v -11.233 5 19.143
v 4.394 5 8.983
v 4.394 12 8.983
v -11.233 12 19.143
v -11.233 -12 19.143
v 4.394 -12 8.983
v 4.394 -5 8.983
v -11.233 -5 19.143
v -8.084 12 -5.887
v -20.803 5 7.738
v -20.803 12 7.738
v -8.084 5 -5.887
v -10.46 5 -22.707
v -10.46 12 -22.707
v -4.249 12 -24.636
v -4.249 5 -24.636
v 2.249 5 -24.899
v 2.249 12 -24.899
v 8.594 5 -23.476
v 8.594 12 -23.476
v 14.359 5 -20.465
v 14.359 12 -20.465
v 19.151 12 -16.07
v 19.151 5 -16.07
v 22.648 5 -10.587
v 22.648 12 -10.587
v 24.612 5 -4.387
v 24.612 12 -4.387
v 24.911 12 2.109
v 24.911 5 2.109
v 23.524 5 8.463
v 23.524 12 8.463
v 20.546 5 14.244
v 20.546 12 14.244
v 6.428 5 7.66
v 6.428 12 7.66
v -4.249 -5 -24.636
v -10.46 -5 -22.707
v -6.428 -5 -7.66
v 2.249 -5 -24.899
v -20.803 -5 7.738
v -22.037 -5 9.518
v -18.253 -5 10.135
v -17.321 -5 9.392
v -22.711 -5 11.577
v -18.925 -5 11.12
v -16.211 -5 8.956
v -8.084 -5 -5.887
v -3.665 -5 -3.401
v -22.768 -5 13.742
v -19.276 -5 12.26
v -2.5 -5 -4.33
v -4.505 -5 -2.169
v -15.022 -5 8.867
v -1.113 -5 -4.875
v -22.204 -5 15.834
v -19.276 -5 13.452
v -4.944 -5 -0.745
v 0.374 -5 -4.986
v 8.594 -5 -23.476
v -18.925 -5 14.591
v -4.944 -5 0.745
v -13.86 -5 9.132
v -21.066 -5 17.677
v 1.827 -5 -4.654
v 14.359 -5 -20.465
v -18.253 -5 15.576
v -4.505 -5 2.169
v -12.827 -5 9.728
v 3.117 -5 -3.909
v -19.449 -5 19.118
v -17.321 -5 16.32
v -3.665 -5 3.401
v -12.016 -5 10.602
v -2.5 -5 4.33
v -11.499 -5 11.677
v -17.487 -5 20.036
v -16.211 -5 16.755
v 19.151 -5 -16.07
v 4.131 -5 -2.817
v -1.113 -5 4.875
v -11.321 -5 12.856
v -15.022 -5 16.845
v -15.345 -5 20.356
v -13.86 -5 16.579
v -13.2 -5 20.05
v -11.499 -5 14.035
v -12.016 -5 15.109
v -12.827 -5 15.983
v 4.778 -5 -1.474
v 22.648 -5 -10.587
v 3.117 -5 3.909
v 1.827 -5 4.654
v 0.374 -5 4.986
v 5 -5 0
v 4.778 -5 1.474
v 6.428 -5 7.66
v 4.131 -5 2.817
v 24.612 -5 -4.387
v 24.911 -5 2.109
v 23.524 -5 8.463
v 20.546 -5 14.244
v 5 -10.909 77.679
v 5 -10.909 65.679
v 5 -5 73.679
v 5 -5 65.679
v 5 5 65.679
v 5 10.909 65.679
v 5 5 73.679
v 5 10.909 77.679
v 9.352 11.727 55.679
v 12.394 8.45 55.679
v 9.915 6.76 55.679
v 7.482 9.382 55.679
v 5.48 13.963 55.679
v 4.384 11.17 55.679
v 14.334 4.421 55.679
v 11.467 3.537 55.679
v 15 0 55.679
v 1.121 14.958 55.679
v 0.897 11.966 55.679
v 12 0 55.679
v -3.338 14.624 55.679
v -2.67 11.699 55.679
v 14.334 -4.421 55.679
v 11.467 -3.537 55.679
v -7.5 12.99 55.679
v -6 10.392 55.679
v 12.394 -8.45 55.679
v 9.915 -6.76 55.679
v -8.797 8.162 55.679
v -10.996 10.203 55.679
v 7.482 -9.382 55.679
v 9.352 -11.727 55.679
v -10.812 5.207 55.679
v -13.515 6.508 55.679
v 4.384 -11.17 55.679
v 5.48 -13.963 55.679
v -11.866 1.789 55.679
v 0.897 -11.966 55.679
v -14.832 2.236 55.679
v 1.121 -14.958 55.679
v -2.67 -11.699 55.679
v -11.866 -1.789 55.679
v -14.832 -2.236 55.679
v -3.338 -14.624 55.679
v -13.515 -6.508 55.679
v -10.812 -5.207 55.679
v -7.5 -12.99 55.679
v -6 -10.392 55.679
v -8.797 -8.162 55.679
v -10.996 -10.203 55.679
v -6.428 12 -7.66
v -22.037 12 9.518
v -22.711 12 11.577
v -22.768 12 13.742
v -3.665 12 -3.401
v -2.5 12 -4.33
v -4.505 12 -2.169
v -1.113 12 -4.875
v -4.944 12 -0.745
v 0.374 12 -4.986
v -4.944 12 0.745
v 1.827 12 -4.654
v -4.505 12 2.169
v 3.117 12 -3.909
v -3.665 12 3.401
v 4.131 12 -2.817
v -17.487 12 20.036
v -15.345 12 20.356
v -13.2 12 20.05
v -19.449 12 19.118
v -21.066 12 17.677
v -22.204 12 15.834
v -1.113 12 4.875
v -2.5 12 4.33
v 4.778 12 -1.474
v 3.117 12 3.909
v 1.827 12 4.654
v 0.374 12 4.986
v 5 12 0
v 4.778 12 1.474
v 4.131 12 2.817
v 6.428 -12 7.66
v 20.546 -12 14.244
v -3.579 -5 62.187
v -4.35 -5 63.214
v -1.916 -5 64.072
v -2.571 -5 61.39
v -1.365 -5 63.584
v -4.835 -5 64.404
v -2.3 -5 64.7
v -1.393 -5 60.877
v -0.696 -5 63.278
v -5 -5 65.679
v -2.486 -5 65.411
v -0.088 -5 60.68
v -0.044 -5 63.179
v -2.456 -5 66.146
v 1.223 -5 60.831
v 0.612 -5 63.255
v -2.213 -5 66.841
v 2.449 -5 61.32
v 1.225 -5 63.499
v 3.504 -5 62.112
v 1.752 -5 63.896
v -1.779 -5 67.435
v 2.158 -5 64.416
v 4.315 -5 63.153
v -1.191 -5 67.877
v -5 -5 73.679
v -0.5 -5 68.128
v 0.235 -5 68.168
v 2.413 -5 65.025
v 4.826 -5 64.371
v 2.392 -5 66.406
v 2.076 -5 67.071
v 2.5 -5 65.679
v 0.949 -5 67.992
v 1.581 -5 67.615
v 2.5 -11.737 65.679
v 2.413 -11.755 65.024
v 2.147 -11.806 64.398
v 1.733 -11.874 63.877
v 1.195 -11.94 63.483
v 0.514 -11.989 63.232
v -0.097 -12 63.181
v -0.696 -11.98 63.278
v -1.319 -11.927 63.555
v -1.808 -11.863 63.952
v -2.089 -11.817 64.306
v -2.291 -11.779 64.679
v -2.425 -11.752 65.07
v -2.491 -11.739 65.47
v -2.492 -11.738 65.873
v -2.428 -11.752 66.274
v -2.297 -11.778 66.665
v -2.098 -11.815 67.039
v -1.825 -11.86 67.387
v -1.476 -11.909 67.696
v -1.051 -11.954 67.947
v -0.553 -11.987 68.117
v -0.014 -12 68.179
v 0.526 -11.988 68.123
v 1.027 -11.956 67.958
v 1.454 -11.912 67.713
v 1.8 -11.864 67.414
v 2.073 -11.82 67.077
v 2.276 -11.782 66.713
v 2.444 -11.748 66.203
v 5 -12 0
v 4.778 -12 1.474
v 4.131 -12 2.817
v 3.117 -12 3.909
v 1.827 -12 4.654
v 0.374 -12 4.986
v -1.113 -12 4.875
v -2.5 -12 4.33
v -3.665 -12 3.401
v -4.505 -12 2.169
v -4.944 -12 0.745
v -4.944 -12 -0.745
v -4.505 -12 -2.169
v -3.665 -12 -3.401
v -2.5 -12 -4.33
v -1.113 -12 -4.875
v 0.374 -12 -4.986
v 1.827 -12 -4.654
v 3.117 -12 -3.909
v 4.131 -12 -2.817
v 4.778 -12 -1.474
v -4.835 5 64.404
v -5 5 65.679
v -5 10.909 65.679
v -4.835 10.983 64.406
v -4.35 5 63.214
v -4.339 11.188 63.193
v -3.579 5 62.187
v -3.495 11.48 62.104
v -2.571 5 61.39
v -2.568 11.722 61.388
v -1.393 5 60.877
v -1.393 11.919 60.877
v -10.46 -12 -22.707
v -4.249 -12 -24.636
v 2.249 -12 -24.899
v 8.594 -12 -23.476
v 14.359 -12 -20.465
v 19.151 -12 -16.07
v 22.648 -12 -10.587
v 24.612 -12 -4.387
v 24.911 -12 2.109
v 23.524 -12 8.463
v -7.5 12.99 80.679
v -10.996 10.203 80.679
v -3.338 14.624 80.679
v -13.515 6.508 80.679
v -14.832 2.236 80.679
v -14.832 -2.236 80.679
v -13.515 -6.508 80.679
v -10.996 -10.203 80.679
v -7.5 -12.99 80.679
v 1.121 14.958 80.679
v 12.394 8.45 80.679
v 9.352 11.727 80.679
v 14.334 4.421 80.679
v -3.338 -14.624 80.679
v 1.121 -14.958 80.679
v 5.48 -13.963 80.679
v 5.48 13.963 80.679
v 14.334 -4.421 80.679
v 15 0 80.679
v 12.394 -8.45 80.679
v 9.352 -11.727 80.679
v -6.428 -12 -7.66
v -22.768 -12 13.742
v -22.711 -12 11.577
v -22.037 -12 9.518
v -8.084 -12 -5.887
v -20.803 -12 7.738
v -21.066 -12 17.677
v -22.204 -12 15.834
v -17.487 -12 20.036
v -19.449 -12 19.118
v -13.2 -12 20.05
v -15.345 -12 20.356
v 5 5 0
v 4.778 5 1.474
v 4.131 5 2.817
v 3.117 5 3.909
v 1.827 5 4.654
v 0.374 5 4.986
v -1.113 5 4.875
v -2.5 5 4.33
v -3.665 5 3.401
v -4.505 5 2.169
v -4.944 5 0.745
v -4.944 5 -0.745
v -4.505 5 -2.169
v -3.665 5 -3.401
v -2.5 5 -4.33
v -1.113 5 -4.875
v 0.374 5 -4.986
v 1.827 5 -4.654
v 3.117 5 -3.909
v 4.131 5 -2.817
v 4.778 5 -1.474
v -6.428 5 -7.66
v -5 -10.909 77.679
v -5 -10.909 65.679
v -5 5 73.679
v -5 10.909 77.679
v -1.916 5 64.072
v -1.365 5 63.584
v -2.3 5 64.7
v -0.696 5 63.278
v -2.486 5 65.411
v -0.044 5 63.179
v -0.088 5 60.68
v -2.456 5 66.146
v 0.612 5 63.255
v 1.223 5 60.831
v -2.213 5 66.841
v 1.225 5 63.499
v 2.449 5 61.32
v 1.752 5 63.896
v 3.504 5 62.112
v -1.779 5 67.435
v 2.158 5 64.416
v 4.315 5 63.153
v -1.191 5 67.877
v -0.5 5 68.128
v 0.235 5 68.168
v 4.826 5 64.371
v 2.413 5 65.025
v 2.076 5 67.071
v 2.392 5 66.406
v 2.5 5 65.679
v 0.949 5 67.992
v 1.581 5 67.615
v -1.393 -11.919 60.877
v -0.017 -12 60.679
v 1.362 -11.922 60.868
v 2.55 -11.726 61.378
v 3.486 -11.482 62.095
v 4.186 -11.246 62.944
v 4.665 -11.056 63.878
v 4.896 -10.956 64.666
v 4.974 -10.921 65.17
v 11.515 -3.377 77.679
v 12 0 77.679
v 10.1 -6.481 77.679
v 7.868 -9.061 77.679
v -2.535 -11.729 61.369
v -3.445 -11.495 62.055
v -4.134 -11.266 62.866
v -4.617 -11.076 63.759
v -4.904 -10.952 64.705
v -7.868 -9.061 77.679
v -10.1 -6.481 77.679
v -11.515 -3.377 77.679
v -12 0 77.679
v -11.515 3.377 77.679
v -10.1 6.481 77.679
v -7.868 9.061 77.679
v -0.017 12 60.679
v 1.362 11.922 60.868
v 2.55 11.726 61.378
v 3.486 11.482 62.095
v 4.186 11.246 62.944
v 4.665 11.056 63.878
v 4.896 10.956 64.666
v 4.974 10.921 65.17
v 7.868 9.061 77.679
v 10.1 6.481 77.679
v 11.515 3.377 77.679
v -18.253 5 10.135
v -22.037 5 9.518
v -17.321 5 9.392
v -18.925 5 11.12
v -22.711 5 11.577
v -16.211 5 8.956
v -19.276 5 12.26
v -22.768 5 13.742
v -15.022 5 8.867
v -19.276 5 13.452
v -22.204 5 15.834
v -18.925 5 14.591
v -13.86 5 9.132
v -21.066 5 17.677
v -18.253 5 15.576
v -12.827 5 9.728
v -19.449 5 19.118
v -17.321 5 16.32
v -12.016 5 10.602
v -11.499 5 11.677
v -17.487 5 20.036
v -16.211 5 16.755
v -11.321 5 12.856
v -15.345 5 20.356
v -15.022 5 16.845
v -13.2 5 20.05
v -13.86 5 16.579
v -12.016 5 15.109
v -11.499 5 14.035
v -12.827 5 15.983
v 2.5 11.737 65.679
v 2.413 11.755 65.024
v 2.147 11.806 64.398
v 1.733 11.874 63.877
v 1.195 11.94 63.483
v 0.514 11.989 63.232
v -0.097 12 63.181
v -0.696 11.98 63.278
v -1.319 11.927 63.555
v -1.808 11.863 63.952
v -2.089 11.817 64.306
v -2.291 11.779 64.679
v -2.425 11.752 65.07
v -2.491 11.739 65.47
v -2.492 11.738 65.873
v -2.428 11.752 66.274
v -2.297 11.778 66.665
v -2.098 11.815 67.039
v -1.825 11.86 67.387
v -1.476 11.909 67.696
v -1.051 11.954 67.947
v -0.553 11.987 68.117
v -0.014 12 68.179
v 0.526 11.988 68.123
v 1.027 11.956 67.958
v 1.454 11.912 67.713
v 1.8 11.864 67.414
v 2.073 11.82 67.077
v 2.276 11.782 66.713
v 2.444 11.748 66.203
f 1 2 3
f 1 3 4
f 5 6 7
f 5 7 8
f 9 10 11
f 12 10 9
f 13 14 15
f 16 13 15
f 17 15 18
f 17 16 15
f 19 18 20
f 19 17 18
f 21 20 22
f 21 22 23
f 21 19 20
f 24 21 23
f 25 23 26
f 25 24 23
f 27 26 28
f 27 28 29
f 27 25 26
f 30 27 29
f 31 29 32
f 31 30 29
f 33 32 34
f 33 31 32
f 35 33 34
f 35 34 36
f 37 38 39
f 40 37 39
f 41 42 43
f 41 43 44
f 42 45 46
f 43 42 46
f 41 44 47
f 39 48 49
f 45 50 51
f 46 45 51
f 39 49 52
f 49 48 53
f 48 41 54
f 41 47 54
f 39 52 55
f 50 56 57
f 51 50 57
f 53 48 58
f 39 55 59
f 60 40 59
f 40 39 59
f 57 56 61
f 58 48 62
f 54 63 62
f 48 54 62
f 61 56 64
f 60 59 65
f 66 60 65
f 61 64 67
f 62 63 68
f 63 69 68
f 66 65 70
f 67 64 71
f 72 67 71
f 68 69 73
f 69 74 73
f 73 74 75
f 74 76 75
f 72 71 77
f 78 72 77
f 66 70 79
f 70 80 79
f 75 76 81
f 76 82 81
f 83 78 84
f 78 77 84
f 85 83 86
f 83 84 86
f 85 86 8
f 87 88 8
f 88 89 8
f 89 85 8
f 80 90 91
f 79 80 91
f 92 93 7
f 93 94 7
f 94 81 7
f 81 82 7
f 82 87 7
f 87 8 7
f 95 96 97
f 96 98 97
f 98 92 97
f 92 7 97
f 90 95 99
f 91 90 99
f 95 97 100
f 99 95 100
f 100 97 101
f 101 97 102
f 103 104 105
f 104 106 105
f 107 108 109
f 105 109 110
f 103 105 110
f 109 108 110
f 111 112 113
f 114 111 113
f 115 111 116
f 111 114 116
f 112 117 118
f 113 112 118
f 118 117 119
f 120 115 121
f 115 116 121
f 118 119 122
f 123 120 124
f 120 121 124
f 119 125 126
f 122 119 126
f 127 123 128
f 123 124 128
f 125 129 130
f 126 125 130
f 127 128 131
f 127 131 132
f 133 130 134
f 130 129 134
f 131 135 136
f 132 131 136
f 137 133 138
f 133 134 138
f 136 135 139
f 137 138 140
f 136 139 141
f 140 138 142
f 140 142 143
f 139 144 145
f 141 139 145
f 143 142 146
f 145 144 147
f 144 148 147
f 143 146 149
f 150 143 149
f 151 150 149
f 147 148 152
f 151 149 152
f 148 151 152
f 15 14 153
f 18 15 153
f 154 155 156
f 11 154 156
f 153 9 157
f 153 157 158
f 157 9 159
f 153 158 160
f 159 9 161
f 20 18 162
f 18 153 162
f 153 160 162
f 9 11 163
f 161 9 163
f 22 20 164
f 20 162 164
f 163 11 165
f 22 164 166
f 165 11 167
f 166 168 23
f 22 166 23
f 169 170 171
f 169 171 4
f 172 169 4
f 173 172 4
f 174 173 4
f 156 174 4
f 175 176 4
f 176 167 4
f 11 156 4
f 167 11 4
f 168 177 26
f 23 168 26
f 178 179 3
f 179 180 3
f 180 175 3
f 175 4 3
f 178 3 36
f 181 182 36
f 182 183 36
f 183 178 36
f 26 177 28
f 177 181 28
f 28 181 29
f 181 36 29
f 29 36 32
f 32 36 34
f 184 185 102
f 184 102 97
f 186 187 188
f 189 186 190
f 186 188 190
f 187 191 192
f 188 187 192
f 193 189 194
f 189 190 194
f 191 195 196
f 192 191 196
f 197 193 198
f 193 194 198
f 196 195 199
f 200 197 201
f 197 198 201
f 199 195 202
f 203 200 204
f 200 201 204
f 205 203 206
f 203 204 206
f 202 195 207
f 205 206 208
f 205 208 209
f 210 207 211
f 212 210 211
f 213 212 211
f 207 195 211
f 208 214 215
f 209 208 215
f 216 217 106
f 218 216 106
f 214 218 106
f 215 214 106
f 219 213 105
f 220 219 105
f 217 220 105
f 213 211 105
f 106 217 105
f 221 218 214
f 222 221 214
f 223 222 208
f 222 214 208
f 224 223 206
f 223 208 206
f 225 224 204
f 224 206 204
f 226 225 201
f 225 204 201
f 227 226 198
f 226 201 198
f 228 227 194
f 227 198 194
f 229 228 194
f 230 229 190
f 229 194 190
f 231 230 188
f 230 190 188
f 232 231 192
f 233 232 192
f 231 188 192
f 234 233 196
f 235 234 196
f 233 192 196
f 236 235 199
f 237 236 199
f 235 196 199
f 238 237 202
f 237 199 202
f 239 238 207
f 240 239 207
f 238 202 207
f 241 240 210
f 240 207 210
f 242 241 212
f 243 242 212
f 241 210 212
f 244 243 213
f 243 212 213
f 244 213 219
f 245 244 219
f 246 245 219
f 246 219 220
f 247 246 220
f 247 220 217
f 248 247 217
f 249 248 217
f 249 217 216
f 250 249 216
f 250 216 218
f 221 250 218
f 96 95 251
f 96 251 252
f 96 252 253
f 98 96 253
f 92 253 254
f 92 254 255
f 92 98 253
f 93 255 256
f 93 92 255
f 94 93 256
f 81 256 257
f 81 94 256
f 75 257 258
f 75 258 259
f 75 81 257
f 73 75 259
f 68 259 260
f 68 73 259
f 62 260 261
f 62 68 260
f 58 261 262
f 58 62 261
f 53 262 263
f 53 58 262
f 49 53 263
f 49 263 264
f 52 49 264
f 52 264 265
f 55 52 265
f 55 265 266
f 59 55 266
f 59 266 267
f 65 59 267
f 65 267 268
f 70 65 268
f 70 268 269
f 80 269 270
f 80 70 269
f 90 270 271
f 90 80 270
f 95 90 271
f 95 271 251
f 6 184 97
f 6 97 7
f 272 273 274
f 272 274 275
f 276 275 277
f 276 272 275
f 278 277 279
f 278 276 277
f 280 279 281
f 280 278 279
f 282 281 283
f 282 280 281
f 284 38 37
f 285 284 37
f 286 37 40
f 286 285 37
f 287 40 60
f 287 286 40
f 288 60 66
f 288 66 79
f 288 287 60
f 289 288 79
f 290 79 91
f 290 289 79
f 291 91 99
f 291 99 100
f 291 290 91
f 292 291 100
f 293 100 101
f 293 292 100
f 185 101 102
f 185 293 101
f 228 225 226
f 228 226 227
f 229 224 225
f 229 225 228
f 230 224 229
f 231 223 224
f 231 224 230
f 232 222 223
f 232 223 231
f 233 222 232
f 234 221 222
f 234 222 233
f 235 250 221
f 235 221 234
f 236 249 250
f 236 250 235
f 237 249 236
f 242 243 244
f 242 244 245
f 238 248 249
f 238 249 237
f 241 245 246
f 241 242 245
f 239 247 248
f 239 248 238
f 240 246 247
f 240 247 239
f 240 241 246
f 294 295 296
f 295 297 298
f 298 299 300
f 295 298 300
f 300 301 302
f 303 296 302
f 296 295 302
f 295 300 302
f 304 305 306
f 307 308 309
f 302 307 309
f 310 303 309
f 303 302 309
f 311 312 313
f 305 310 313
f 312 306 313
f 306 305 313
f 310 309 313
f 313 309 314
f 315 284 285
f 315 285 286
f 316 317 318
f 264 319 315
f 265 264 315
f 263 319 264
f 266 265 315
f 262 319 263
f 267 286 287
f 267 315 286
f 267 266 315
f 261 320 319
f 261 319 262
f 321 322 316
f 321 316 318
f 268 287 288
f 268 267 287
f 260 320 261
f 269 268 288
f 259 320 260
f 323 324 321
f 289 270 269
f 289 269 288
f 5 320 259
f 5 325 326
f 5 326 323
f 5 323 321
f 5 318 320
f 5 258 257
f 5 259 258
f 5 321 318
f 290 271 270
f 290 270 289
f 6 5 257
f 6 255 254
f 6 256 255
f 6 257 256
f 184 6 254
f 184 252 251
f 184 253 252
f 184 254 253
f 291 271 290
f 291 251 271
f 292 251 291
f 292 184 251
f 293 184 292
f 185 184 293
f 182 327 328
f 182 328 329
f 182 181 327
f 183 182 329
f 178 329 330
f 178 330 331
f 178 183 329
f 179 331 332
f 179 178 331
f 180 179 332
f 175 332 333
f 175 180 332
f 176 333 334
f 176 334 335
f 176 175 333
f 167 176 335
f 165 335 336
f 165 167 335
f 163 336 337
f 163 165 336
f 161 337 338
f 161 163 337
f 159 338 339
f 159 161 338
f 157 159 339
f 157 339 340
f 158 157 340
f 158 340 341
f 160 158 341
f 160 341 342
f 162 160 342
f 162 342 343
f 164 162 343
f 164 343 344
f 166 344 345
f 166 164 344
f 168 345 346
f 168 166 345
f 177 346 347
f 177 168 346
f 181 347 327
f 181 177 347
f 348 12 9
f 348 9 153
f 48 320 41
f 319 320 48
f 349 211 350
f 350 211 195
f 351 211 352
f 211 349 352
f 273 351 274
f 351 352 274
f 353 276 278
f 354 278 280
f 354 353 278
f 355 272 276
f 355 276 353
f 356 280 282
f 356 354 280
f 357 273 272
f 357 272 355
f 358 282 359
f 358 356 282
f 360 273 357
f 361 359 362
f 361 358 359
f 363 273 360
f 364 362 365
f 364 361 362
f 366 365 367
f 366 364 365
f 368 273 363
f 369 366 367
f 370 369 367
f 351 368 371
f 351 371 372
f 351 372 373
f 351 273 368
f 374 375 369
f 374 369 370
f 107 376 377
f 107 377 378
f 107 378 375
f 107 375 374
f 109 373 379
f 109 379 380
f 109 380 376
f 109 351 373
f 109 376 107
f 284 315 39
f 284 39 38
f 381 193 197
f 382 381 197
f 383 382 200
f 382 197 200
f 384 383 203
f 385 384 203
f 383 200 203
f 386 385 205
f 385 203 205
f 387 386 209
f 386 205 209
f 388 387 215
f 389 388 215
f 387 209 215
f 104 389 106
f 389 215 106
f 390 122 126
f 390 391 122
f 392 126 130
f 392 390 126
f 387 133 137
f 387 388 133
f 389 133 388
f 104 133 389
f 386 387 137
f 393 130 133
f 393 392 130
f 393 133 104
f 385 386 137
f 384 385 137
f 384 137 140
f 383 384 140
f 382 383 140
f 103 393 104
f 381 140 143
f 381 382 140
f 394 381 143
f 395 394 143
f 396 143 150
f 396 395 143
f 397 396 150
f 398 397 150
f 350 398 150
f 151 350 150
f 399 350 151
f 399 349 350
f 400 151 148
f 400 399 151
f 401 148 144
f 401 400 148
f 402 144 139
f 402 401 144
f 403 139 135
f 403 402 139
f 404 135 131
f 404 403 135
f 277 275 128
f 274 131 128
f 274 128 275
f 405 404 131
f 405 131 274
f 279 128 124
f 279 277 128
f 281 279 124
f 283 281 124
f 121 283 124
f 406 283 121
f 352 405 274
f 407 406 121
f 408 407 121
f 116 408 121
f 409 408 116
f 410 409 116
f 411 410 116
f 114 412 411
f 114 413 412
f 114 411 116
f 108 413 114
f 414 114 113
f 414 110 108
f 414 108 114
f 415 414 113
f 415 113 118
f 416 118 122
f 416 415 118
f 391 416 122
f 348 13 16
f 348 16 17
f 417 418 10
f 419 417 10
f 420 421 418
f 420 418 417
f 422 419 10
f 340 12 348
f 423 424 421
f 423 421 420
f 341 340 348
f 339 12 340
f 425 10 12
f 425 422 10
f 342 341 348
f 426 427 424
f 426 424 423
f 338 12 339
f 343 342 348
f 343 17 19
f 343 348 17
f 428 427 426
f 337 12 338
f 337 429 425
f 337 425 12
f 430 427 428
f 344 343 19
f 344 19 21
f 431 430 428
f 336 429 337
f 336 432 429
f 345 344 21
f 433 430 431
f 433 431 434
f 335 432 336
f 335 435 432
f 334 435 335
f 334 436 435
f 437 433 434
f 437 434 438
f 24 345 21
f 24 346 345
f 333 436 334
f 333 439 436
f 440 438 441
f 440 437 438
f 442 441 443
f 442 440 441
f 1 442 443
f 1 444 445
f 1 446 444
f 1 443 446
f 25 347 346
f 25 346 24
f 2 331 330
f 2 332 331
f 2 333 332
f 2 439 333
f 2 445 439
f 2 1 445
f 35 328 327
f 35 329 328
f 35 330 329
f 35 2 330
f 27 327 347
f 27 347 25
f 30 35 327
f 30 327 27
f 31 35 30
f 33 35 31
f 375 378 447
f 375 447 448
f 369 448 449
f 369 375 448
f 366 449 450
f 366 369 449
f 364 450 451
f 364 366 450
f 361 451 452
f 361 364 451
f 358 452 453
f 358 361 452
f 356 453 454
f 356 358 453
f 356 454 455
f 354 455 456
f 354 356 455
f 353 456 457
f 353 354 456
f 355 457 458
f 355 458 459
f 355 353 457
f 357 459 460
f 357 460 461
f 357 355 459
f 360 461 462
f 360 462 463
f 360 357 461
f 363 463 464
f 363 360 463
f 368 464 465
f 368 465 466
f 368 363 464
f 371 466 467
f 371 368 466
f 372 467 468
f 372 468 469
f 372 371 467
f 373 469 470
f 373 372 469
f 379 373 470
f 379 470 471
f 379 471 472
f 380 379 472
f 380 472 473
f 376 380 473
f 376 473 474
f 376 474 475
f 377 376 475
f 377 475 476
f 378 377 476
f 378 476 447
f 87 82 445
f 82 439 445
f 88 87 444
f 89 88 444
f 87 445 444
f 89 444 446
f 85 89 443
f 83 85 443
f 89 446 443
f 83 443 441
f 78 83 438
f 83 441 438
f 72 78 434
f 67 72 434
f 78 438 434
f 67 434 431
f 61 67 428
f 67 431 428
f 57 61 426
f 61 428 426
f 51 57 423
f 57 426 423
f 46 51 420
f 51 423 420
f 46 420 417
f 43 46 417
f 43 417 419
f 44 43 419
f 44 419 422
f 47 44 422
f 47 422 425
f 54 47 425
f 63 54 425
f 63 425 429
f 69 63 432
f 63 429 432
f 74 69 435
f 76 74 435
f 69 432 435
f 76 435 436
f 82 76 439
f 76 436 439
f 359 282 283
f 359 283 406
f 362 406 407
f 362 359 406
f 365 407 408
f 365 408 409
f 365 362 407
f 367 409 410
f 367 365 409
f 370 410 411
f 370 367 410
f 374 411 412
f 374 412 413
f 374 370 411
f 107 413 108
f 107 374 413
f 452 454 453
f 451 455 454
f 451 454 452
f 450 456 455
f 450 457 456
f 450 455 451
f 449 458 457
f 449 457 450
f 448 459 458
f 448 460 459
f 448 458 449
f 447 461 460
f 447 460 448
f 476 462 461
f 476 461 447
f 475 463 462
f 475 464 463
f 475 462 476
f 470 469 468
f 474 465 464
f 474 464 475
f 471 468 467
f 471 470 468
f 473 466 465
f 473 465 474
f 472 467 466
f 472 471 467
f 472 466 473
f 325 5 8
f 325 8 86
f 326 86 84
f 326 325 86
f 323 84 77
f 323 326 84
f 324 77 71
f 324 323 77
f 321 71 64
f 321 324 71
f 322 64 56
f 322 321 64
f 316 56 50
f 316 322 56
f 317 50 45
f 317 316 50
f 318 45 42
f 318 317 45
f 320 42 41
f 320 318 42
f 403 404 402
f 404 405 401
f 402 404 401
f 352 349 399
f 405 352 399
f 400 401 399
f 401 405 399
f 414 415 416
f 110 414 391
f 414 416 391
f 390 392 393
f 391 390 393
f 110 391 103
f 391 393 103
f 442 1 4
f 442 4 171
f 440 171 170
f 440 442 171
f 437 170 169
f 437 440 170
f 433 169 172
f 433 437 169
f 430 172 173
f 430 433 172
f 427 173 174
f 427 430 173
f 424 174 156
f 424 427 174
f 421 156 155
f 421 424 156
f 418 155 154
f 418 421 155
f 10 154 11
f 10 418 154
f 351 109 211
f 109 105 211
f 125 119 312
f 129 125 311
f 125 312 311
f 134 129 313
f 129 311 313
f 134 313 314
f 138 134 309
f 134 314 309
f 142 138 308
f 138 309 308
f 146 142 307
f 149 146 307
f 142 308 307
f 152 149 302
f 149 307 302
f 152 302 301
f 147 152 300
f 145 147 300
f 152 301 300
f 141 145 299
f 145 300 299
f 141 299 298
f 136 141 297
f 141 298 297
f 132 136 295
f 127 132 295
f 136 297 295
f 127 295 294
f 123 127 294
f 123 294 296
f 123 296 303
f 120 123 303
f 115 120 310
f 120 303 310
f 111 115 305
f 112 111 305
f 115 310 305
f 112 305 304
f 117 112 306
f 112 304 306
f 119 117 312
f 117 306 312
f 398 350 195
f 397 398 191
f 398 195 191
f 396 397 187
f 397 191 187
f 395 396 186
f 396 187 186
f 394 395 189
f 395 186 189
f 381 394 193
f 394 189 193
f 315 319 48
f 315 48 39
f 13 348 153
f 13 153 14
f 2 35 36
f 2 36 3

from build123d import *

# Parameters (mm, degrees)
F2_W          = 15
F2_H          = 25
F4_T          = -3
F0_W          = 10
F0_H          = 7
F5_DEPTH      = 13.0000001
F5_DEPTH_BACK = 13.0000001
F1_R          = 5
F1_R_2        = 4
F6_DEPTH      = 12
F6_DEPTH_BACK = 12
F7_DEPTH      = 12
F8_DEPTH      = 5
F9_DEPTH      = 5


with BuildPart() as f3:
    # F2 (on Front) → F3 (revolve)
    with BuildSketch(Plane.XZ):
        with Locations((7.5, 68.178761995)):
            Rectangle(F2_W, F2_H)
    revolve(axis=Axis((0, 0, -11.7868287861), (0, 0, -1)))

    # F4
    f4_openings = [f3.faces().sort_by_distance(p)[0] for p in [
        (0, 0, 55.678762),
    ]]
    offset(amount=F4_T, openings=f4_openings)

    # F0 (on Front) → F5 (join, two sides)
    with BuildSketch(Plane.XZ) as f5_sk:
        with Locations((0, 77.178761995)):
            Rectangle(F0_W, F0_H)
        with BuildLine():
            Line((5, 73.678761995), (-5, 73.678761995))
            Line((-5, 73.678761995), (-5, 65.678761995))
            ThreePointArc((-5, 65.678761995), (-3.9977518928, 62.6757668562), (-1.3928080784, 60.8766701949))
            ThreePointArc((-1.3928080784, 60.8766701949), (3.0029951389, 61.6810101023), (5, 65.678761995))
            Line((5, 65.678761995), (5, 73.678761995))
        make_face()
        with BuildLine():
            ThreePointArc((2.5, 65.678761995), (1.5014975694, 63.6798860486), (-0.6964040392, 63.277716095))
            ThreePointArc((-0.6964040392, 63.277716095), (-1.5014975694, 67.6776379414), (2.5, 65.678761995))
        make_face(mode=Mode.SUBTRACT)
    extrude(amount=F5_DEPTH)
    extrude(f5_sk.sketch, amount=-F5_DEPTH_BACK)

    # F0 (on Front) → F8 (cut, symmetric)
    with BuildSketch(Plane.XZ):
        with BuildLine():
            Line((5, 73.678761995), (-5, 73.678761995))
            Line((-5, 73.678761995), (-5, 65.678761995))
            ThreePointArc((-5, 65.678761995), (-3.9977518928, 62.6757668562), (-1.3928080784, 60.8766701949))
            ThreePointArc((-1.3928080784, 60.8766701949), (3.0029951389, 61.6810101023), (5, 65.678761995))
            Line((5, 65.678761995), (5, 73.678761995))
        make_face()
        with BuildLine():
            ThreePointArc((2.5, 65.678761995), (1.5014975694, 63.6798860486), (-0.6964040392, 63.277716095))
            ThreePointArc((-0.6964040392, 63.277716095), (-1.5014975694, 67.6776379414), (2.5, 65.678761995))
        make_face(mode=Mode.SUBTRACT)
    extrude(amount=F8_DEPTH, both=True, mode=Mode.SUBTRACT)


with BuildPart() as f6:
    # F1 (on Front) → F6 (new body, two sides)
    with BuildSketch(Plane.XZ) as f6_sk:
        with BuildLine():
            Line((20.545541793, 14.2436200606), (6.4278760969, 7.6604444312))
            ThreePointArc((6.4278760969, 7.6604444312), (9.0630778704, 4.2261826174), (10, 0))
            ThreePointArc((10, 0), (4.2261826174, -9.0630778704), (-6.4278760969, -7.6604444312))
            Line((-6.4278760969, -7.6604444312), (-10.4595315751, -22.7067875145))
            ThreePointArc((-10.4595315751, -22.7067875145), (19.151111078, -16.0696902422), (20.545541793, 14.2436200606))
        make_face()
        with BuildLine():
            Line((6.4278760969, 7.6604444312), (4.3938839854, 8.9829718647))
            ThreePointArc((4.3938839854, 8.9829718647), (-7.6604444312, 6.4278760969), (-8.0835103905, -5.887007709))
            Line((-8.0835103905, -5.887007709), (-6.4278760969, -7.6604444312))
            ThreePointArc((-6.4278760969, -7.6604444312), (4.2261826174, -9.0630778704), (10, 0))
            ThreePointArc((10, 0), (9.0630778704, 4.2261826174), (6.4278760969, 7.6604444312))
        make_face()
        Circle(F1_R, mode=Mode.SUBTRACT)
        with BuildLine():
            ThreePointArc((-11.2325362548, 19.1434682303), (-8.7287479144, 16.4325772833), (-7.8208888624, 12.8557521937))
            ThreePointArc((-7.8208888624, 12.8557521937), (-12.5701547705, 5.8783986872), (-20.8031453839, 7.7376604173))
            Line((-20.8031453839, 7.7376604173), (-8.0835103905, -5.887007709))
            ThreePointArc((-8.0835103905, -5.887007709), (-7.6604444312, 6.4278760969), (4.3938839854, 8.9829718647))
            Line((4.3938839854, 8.9829718647), (-11.2325362548, 19.1434682303))
        make_face()
        with BuildLine():
            ThreePointArc((-20.8031453839, 7.7376604173), (-12.5701547705, 5.8783986872), (-7.8208888624, 12.8557521937))
            ThreePointArc((-7.8208888624, 12.8557521937), (-8.7287479144, 16.4325772833), (-11.2325362548, 19.1434682303))
            ThreePointArc((-11.2325362548, 19.1434682303), (-21.0662221858, 17.6766592664), (-20.8031453839, 7.7376604173))
        make_face()
        with Locations((-15.3208888624, 12.8557521937)):
            Circle(F1_R_2, mode=Mode.SUBTRACT)
    extrude(amount=F6_DEPTH)
    extrude(f6_sk.sketch, amount=-F6_DEPTH_BACK)

    # F1 (on Front) → F7 (join, symmetric)
    with BuildSketch(Plane.XZ):
        with Locations((-15.3208888624, 12.8557521937)):
            Circle(F1_R_2)
    extrude(amount=F7_DEPTH, both=True)

    # F1 (on Front) → F9 (cut, symmetric)
    with BuildSketch(Plane.XZ):
        with BuildLine():
            Line((20.545541793, 14.2436200606), (6.4278760969, 7.6604444312))
            ThreePointArc((6.4278760969, 7.6604444312), (9.0630778704, 4.2261826174), (10, 0))
            ThreePointArc((10, 0), (4.2261826174, -9.0630778704), (-6.4278760969, -7.6604444312))
            Line((-6.4278760969, -7.6604444312), (-10.4595315751, -22.7067875145))
            ThreePointArc((-10.4595315751, -22.7067875145), (19.151111078, -16.0696902422), (20.545541793, 14.2436200606))
        make_face()
        with BuildLine():
            ThreePointArc((-11.2325362548, 19.1434682303), (-8.7287479144, 16.4325772833), (-7.8208888624, 12.8557521937))
            ThreePointArc((-7.8208888624, 12.8557521937), (-12.5701547705, 5.8783986872), (-20.8031453839, 7.7376604173))
            Line((-20.8031453839, 7.7376604173), (-8.0835103905, -5.887007709))
            ThreePointArc((-8.0835103905, -5.887007709), (-7.6604444312, 6.4278760969), (4.3938839854, 8.9829718647))
            Line((4.3938839854, 8.9829718647), (-11.2325362548, 19.1434682303))
        make_face()
        with BuildLine():
            ThreePointArc((-20.8031453839, 7.7376604173), (-12.5701547705, 5.8783986872), (-7.8208888624, 12.8557521937))
            ThreePointArc((-7.8208888624, 12.8557521937), (-8.7287479144, 16.4325772833), (-11.2325362548, 19.1434682303))
            ThreePointArc((-11.2325362548, 19.1434682303), (-21.0662221858, 17.6766592664), (-20.8031453839, 7.7376604173))
        make_face()
        with Locations((-15.3208888624, 12.8557521937)):
            Circle(F1_R_2, mode=Mode.SUBTRACT)
        with BuildLine():
            Line((6.4278760969, 7.6604444312), (4.3938839854, 8.9829718647))
            ThreePointArc((4.3938839854, 8.9829718647), (-7.6604444312, 6.4278760969), (-8.0835103905, -5.887007709))
            Line((-8.0835103905, -5.887007709), (-6.4278760969, -7.6604444312))
            ThreePointArc((-6.4278760969, -7.6604444312), (4.2261826174, -9.0630778704), (10, 0))
            ThreePointArc((10, 0), (9.0630778704, 4.2261826174), (6.4278760969, 7.6604444312))
        make_face()
        Circle(F1_R, mode=Mode.SUBTRACT)
    extrude(amount=F9_DEPTH, both=True, mode=Mode.SUBTRACT)


solid = Compound([f3.part, f6.part])
